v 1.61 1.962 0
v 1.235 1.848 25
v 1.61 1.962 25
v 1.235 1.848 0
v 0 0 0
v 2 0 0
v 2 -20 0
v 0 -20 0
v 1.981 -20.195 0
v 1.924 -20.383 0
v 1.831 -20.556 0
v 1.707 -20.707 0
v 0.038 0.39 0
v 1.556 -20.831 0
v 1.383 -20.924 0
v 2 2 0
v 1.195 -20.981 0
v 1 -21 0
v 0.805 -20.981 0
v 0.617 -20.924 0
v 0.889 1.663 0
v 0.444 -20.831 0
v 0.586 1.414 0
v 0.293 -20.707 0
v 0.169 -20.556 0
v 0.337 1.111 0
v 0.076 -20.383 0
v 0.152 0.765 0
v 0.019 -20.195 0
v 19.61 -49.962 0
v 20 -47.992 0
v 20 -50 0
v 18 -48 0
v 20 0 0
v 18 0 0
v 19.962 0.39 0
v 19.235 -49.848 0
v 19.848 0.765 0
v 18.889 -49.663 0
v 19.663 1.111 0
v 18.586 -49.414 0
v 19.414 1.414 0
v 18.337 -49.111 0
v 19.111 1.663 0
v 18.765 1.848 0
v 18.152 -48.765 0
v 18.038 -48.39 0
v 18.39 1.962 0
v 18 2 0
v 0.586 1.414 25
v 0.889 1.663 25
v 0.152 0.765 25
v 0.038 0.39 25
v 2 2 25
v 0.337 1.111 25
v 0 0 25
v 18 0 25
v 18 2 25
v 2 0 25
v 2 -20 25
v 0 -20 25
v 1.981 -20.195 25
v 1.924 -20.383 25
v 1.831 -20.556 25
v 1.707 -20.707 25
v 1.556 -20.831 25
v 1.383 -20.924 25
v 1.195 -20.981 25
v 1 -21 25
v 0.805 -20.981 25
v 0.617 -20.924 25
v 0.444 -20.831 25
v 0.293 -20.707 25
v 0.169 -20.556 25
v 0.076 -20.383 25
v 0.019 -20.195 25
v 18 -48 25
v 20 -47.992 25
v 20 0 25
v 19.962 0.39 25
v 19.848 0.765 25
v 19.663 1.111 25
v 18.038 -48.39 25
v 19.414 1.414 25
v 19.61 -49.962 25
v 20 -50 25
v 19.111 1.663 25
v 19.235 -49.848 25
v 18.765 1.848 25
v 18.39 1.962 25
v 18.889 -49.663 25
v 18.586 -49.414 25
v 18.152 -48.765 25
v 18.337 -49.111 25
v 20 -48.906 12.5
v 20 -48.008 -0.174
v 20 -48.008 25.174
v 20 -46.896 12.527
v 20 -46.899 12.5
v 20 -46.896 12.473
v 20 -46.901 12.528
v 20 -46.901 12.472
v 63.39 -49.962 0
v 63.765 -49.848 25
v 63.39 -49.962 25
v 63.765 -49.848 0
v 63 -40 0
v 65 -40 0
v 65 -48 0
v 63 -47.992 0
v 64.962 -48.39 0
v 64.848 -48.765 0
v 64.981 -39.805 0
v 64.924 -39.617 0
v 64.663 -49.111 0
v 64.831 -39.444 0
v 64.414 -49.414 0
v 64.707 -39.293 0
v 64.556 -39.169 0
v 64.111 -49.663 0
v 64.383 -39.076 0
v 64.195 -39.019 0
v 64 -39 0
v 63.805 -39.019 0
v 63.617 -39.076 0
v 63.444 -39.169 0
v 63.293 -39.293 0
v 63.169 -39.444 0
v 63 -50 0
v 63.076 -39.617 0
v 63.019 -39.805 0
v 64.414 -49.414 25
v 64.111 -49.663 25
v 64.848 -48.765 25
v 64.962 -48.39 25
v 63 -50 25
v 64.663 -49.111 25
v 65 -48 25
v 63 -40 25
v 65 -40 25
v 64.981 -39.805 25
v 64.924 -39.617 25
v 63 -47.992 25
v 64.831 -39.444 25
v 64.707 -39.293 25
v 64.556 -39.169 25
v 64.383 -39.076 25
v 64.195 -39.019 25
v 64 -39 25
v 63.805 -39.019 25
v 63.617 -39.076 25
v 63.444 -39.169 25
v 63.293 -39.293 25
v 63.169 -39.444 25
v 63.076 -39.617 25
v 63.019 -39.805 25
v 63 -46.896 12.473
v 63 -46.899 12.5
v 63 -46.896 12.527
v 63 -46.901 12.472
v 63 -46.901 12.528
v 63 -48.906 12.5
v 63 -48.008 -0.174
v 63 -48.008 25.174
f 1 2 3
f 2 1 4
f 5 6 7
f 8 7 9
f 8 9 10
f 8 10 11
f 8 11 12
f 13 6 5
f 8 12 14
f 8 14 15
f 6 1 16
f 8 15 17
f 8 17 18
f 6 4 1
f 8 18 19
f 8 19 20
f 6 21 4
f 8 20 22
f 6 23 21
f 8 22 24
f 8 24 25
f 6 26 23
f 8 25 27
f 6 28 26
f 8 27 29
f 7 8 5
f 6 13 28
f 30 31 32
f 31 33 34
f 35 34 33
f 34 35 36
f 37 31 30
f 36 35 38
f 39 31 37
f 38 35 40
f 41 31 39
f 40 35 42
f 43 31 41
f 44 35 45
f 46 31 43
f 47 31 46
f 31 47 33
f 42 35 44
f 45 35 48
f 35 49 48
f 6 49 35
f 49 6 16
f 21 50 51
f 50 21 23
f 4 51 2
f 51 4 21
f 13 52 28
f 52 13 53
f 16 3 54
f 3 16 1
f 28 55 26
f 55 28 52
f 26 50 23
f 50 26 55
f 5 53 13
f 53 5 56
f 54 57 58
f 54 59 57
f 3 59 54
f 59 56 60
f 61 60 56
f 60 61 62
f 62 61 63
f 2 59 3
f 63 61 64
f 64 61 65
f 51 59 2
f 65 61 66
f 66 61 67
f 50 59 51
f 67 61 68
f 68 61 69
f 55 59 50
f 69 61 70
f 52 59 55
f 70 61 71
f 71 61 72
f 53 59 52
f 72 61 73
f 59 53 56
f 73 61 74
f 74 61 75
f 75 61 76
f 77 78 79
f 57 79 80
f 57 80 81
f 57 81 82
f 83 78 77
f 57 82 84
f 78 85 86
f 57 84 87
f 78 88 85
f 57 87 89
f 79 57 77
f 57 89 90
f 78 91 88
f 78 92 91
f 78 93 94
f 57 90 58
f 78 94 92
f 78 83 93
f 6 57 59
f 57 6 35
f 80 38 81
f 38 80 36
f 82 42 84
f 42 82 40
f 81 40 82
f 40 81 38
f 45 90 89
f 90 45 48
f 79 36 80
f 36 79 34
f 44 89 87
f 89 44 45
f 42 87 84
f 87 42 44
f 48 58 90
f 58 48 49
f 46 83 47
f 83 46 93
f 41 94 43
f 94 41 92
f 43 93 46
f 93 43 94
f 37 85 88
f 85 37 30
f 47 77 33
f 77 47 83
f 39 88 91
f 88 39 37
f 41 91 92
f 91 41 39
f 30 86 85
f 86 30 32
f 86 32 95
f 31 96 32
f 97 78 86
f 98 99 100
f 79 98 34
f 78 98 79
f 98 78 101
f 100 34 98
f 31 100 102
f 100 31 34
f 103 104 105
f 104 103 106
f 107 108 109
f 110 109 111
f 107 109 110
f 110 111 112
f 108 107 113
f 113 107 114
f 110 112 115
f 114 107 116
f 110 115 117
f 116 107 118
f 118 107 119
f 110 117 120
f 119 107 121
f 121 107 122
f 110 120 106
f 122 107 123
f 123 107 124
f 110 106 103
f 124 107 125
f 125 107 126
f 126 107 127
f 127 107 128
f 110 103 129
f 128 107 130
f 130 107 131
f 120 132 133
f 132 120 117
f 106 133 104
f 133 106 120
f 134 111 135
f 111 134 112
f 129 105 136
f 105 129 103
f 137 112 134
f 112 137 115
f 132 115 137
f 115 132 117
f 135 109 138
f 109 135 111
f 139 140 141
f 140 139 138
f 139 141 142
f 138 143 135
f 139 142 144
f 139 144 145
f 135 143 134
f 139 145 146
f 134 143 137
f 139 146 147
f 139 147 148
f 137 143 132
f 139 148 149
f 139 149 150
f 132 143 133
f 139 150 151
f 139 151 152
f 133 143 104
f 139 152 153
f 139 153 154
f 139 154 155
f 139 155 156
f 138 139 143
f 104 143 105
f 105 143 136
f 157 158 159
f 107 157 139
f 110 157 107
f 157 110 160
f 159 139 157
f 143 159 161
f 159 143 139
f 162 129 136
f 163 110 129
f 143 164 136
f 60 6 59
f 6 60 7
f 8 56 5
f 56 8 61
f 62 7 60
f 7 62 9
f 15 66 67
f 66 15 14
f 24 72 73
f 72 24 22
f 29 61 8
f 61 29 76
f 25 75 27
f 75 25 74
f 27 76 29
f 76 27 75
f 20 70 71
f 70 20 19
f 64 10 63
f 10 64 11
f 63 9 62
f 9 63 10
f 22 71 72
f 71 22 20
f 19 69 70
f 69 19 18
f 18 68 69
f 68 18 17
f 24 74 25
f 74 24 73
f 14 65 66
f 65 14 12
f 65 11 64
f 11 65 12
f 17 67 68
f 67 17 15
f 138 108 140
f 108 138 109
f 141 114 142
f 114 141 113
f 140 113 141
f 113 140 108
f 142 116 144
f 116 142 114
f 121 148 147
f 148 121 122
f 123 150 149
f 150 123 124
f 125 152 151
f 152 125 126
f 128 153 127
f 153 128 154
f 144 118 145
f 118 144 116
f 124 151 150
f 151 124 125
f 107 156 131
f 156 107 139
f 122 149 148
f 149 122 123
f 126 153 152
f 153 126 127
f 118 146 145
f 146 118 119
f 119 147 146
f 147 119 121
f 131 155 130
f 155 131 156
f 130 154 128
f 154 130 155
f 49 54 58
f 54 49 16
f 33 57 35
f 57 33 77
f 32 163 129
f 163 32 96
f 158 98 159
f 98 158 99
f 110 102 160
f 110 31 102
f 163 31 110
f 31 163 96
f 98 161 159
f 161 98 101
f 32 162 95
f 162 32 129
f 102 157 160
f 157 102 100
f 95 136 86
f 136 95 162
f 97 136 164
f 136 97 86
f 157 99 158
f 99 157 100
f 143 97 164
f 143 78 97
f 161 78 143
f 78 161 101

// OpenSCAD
/*
The MIT License (MIT)

Copyright (c) 2020 Shinichi Ohki.

Permission is hereby granted, free of charge, to any person obtaining a copy
of this software and associated documentation files (the "Software"), to deal
in the Software without restriction, including without limitation the rights
to use, copy, modify, merge, publish, distribute, sublicense, and/or sell
copies of the Software, and to permit persons to whom the Software is
furnished to do so, subject to the following conditions:

The above copyright notice and this permission notice shall be included in
all copies or substantial portions of the Software.

THE SOFTWARE IS PROVIDED "AS IS", WITHOUT WARRANTY OF ANY KIND, EXPRESS OR
IMPLIED, INCLUDING BUT NOT LIMITED TO THE WARRANTIES OF MERCHANTABILITY,
FITNESS FOR A PARTICULAR PURPOSE AND NONINFRINGEMENT. IN NO EVENT SHALL THE
AUTHORS OR COPYRIGHT HOLDERS BE LIABLE FOR ANY CLAIM, DAMAGES OR OTHER
LIABILITY, WHETHER IN AN ACTION OF CONTRACT, TORT OR OTHERWISE, ARISING FROM,
OUT OF OR IN CONNECTION WITH THE SOFTWARE OR THE USE OR OTHER DEALINGS IN
THE SOFTWARE.
*/

w = 25;
$fn=32;

module kadomaru(w,dir) {
  rotate(dir*90) {
    intersection() {
      translate([2,0,0]) {
        cylinder(h=w,r=2);
      }
      cube([2,2,w]);
    }
  }
}

kadomaru(w,0);
translate([18,2,0]) {
  kadomaru(w,3);
}
translate([20,-50,0]) {
  kadomaru(w,1);
}
translate([65,-48,0]) {
  kadomaru(w,2);
}

translate([2,0,0]) {
  cube([16,2,w]);
}

translate([0,-20,0]) {
  cube([2,20,w]);
  translate([1,0,0]) {
    cylinder(h=w,r=1);
  }
}

translate([18,-48,0]) {
  cube([2,48,w]);
}

translate([20,-50,0]) {
  rotate([-5,0,0]) {
    cube([43,2,w/2*1.02]);
  }
}


translate([20,-50,w]) {
  rotate([0,180,0]) {
    mirror([1,0,0]){
      rotate([-5,0,0]) {
        cube([43,2,w/2*1.02]);
      }
    }
  }
}

translate([63,-48,0]) {
  cube([2,8,w]);
  translate([1,8,0]) {
    cylinder(h=w,r=1);
  }
}
